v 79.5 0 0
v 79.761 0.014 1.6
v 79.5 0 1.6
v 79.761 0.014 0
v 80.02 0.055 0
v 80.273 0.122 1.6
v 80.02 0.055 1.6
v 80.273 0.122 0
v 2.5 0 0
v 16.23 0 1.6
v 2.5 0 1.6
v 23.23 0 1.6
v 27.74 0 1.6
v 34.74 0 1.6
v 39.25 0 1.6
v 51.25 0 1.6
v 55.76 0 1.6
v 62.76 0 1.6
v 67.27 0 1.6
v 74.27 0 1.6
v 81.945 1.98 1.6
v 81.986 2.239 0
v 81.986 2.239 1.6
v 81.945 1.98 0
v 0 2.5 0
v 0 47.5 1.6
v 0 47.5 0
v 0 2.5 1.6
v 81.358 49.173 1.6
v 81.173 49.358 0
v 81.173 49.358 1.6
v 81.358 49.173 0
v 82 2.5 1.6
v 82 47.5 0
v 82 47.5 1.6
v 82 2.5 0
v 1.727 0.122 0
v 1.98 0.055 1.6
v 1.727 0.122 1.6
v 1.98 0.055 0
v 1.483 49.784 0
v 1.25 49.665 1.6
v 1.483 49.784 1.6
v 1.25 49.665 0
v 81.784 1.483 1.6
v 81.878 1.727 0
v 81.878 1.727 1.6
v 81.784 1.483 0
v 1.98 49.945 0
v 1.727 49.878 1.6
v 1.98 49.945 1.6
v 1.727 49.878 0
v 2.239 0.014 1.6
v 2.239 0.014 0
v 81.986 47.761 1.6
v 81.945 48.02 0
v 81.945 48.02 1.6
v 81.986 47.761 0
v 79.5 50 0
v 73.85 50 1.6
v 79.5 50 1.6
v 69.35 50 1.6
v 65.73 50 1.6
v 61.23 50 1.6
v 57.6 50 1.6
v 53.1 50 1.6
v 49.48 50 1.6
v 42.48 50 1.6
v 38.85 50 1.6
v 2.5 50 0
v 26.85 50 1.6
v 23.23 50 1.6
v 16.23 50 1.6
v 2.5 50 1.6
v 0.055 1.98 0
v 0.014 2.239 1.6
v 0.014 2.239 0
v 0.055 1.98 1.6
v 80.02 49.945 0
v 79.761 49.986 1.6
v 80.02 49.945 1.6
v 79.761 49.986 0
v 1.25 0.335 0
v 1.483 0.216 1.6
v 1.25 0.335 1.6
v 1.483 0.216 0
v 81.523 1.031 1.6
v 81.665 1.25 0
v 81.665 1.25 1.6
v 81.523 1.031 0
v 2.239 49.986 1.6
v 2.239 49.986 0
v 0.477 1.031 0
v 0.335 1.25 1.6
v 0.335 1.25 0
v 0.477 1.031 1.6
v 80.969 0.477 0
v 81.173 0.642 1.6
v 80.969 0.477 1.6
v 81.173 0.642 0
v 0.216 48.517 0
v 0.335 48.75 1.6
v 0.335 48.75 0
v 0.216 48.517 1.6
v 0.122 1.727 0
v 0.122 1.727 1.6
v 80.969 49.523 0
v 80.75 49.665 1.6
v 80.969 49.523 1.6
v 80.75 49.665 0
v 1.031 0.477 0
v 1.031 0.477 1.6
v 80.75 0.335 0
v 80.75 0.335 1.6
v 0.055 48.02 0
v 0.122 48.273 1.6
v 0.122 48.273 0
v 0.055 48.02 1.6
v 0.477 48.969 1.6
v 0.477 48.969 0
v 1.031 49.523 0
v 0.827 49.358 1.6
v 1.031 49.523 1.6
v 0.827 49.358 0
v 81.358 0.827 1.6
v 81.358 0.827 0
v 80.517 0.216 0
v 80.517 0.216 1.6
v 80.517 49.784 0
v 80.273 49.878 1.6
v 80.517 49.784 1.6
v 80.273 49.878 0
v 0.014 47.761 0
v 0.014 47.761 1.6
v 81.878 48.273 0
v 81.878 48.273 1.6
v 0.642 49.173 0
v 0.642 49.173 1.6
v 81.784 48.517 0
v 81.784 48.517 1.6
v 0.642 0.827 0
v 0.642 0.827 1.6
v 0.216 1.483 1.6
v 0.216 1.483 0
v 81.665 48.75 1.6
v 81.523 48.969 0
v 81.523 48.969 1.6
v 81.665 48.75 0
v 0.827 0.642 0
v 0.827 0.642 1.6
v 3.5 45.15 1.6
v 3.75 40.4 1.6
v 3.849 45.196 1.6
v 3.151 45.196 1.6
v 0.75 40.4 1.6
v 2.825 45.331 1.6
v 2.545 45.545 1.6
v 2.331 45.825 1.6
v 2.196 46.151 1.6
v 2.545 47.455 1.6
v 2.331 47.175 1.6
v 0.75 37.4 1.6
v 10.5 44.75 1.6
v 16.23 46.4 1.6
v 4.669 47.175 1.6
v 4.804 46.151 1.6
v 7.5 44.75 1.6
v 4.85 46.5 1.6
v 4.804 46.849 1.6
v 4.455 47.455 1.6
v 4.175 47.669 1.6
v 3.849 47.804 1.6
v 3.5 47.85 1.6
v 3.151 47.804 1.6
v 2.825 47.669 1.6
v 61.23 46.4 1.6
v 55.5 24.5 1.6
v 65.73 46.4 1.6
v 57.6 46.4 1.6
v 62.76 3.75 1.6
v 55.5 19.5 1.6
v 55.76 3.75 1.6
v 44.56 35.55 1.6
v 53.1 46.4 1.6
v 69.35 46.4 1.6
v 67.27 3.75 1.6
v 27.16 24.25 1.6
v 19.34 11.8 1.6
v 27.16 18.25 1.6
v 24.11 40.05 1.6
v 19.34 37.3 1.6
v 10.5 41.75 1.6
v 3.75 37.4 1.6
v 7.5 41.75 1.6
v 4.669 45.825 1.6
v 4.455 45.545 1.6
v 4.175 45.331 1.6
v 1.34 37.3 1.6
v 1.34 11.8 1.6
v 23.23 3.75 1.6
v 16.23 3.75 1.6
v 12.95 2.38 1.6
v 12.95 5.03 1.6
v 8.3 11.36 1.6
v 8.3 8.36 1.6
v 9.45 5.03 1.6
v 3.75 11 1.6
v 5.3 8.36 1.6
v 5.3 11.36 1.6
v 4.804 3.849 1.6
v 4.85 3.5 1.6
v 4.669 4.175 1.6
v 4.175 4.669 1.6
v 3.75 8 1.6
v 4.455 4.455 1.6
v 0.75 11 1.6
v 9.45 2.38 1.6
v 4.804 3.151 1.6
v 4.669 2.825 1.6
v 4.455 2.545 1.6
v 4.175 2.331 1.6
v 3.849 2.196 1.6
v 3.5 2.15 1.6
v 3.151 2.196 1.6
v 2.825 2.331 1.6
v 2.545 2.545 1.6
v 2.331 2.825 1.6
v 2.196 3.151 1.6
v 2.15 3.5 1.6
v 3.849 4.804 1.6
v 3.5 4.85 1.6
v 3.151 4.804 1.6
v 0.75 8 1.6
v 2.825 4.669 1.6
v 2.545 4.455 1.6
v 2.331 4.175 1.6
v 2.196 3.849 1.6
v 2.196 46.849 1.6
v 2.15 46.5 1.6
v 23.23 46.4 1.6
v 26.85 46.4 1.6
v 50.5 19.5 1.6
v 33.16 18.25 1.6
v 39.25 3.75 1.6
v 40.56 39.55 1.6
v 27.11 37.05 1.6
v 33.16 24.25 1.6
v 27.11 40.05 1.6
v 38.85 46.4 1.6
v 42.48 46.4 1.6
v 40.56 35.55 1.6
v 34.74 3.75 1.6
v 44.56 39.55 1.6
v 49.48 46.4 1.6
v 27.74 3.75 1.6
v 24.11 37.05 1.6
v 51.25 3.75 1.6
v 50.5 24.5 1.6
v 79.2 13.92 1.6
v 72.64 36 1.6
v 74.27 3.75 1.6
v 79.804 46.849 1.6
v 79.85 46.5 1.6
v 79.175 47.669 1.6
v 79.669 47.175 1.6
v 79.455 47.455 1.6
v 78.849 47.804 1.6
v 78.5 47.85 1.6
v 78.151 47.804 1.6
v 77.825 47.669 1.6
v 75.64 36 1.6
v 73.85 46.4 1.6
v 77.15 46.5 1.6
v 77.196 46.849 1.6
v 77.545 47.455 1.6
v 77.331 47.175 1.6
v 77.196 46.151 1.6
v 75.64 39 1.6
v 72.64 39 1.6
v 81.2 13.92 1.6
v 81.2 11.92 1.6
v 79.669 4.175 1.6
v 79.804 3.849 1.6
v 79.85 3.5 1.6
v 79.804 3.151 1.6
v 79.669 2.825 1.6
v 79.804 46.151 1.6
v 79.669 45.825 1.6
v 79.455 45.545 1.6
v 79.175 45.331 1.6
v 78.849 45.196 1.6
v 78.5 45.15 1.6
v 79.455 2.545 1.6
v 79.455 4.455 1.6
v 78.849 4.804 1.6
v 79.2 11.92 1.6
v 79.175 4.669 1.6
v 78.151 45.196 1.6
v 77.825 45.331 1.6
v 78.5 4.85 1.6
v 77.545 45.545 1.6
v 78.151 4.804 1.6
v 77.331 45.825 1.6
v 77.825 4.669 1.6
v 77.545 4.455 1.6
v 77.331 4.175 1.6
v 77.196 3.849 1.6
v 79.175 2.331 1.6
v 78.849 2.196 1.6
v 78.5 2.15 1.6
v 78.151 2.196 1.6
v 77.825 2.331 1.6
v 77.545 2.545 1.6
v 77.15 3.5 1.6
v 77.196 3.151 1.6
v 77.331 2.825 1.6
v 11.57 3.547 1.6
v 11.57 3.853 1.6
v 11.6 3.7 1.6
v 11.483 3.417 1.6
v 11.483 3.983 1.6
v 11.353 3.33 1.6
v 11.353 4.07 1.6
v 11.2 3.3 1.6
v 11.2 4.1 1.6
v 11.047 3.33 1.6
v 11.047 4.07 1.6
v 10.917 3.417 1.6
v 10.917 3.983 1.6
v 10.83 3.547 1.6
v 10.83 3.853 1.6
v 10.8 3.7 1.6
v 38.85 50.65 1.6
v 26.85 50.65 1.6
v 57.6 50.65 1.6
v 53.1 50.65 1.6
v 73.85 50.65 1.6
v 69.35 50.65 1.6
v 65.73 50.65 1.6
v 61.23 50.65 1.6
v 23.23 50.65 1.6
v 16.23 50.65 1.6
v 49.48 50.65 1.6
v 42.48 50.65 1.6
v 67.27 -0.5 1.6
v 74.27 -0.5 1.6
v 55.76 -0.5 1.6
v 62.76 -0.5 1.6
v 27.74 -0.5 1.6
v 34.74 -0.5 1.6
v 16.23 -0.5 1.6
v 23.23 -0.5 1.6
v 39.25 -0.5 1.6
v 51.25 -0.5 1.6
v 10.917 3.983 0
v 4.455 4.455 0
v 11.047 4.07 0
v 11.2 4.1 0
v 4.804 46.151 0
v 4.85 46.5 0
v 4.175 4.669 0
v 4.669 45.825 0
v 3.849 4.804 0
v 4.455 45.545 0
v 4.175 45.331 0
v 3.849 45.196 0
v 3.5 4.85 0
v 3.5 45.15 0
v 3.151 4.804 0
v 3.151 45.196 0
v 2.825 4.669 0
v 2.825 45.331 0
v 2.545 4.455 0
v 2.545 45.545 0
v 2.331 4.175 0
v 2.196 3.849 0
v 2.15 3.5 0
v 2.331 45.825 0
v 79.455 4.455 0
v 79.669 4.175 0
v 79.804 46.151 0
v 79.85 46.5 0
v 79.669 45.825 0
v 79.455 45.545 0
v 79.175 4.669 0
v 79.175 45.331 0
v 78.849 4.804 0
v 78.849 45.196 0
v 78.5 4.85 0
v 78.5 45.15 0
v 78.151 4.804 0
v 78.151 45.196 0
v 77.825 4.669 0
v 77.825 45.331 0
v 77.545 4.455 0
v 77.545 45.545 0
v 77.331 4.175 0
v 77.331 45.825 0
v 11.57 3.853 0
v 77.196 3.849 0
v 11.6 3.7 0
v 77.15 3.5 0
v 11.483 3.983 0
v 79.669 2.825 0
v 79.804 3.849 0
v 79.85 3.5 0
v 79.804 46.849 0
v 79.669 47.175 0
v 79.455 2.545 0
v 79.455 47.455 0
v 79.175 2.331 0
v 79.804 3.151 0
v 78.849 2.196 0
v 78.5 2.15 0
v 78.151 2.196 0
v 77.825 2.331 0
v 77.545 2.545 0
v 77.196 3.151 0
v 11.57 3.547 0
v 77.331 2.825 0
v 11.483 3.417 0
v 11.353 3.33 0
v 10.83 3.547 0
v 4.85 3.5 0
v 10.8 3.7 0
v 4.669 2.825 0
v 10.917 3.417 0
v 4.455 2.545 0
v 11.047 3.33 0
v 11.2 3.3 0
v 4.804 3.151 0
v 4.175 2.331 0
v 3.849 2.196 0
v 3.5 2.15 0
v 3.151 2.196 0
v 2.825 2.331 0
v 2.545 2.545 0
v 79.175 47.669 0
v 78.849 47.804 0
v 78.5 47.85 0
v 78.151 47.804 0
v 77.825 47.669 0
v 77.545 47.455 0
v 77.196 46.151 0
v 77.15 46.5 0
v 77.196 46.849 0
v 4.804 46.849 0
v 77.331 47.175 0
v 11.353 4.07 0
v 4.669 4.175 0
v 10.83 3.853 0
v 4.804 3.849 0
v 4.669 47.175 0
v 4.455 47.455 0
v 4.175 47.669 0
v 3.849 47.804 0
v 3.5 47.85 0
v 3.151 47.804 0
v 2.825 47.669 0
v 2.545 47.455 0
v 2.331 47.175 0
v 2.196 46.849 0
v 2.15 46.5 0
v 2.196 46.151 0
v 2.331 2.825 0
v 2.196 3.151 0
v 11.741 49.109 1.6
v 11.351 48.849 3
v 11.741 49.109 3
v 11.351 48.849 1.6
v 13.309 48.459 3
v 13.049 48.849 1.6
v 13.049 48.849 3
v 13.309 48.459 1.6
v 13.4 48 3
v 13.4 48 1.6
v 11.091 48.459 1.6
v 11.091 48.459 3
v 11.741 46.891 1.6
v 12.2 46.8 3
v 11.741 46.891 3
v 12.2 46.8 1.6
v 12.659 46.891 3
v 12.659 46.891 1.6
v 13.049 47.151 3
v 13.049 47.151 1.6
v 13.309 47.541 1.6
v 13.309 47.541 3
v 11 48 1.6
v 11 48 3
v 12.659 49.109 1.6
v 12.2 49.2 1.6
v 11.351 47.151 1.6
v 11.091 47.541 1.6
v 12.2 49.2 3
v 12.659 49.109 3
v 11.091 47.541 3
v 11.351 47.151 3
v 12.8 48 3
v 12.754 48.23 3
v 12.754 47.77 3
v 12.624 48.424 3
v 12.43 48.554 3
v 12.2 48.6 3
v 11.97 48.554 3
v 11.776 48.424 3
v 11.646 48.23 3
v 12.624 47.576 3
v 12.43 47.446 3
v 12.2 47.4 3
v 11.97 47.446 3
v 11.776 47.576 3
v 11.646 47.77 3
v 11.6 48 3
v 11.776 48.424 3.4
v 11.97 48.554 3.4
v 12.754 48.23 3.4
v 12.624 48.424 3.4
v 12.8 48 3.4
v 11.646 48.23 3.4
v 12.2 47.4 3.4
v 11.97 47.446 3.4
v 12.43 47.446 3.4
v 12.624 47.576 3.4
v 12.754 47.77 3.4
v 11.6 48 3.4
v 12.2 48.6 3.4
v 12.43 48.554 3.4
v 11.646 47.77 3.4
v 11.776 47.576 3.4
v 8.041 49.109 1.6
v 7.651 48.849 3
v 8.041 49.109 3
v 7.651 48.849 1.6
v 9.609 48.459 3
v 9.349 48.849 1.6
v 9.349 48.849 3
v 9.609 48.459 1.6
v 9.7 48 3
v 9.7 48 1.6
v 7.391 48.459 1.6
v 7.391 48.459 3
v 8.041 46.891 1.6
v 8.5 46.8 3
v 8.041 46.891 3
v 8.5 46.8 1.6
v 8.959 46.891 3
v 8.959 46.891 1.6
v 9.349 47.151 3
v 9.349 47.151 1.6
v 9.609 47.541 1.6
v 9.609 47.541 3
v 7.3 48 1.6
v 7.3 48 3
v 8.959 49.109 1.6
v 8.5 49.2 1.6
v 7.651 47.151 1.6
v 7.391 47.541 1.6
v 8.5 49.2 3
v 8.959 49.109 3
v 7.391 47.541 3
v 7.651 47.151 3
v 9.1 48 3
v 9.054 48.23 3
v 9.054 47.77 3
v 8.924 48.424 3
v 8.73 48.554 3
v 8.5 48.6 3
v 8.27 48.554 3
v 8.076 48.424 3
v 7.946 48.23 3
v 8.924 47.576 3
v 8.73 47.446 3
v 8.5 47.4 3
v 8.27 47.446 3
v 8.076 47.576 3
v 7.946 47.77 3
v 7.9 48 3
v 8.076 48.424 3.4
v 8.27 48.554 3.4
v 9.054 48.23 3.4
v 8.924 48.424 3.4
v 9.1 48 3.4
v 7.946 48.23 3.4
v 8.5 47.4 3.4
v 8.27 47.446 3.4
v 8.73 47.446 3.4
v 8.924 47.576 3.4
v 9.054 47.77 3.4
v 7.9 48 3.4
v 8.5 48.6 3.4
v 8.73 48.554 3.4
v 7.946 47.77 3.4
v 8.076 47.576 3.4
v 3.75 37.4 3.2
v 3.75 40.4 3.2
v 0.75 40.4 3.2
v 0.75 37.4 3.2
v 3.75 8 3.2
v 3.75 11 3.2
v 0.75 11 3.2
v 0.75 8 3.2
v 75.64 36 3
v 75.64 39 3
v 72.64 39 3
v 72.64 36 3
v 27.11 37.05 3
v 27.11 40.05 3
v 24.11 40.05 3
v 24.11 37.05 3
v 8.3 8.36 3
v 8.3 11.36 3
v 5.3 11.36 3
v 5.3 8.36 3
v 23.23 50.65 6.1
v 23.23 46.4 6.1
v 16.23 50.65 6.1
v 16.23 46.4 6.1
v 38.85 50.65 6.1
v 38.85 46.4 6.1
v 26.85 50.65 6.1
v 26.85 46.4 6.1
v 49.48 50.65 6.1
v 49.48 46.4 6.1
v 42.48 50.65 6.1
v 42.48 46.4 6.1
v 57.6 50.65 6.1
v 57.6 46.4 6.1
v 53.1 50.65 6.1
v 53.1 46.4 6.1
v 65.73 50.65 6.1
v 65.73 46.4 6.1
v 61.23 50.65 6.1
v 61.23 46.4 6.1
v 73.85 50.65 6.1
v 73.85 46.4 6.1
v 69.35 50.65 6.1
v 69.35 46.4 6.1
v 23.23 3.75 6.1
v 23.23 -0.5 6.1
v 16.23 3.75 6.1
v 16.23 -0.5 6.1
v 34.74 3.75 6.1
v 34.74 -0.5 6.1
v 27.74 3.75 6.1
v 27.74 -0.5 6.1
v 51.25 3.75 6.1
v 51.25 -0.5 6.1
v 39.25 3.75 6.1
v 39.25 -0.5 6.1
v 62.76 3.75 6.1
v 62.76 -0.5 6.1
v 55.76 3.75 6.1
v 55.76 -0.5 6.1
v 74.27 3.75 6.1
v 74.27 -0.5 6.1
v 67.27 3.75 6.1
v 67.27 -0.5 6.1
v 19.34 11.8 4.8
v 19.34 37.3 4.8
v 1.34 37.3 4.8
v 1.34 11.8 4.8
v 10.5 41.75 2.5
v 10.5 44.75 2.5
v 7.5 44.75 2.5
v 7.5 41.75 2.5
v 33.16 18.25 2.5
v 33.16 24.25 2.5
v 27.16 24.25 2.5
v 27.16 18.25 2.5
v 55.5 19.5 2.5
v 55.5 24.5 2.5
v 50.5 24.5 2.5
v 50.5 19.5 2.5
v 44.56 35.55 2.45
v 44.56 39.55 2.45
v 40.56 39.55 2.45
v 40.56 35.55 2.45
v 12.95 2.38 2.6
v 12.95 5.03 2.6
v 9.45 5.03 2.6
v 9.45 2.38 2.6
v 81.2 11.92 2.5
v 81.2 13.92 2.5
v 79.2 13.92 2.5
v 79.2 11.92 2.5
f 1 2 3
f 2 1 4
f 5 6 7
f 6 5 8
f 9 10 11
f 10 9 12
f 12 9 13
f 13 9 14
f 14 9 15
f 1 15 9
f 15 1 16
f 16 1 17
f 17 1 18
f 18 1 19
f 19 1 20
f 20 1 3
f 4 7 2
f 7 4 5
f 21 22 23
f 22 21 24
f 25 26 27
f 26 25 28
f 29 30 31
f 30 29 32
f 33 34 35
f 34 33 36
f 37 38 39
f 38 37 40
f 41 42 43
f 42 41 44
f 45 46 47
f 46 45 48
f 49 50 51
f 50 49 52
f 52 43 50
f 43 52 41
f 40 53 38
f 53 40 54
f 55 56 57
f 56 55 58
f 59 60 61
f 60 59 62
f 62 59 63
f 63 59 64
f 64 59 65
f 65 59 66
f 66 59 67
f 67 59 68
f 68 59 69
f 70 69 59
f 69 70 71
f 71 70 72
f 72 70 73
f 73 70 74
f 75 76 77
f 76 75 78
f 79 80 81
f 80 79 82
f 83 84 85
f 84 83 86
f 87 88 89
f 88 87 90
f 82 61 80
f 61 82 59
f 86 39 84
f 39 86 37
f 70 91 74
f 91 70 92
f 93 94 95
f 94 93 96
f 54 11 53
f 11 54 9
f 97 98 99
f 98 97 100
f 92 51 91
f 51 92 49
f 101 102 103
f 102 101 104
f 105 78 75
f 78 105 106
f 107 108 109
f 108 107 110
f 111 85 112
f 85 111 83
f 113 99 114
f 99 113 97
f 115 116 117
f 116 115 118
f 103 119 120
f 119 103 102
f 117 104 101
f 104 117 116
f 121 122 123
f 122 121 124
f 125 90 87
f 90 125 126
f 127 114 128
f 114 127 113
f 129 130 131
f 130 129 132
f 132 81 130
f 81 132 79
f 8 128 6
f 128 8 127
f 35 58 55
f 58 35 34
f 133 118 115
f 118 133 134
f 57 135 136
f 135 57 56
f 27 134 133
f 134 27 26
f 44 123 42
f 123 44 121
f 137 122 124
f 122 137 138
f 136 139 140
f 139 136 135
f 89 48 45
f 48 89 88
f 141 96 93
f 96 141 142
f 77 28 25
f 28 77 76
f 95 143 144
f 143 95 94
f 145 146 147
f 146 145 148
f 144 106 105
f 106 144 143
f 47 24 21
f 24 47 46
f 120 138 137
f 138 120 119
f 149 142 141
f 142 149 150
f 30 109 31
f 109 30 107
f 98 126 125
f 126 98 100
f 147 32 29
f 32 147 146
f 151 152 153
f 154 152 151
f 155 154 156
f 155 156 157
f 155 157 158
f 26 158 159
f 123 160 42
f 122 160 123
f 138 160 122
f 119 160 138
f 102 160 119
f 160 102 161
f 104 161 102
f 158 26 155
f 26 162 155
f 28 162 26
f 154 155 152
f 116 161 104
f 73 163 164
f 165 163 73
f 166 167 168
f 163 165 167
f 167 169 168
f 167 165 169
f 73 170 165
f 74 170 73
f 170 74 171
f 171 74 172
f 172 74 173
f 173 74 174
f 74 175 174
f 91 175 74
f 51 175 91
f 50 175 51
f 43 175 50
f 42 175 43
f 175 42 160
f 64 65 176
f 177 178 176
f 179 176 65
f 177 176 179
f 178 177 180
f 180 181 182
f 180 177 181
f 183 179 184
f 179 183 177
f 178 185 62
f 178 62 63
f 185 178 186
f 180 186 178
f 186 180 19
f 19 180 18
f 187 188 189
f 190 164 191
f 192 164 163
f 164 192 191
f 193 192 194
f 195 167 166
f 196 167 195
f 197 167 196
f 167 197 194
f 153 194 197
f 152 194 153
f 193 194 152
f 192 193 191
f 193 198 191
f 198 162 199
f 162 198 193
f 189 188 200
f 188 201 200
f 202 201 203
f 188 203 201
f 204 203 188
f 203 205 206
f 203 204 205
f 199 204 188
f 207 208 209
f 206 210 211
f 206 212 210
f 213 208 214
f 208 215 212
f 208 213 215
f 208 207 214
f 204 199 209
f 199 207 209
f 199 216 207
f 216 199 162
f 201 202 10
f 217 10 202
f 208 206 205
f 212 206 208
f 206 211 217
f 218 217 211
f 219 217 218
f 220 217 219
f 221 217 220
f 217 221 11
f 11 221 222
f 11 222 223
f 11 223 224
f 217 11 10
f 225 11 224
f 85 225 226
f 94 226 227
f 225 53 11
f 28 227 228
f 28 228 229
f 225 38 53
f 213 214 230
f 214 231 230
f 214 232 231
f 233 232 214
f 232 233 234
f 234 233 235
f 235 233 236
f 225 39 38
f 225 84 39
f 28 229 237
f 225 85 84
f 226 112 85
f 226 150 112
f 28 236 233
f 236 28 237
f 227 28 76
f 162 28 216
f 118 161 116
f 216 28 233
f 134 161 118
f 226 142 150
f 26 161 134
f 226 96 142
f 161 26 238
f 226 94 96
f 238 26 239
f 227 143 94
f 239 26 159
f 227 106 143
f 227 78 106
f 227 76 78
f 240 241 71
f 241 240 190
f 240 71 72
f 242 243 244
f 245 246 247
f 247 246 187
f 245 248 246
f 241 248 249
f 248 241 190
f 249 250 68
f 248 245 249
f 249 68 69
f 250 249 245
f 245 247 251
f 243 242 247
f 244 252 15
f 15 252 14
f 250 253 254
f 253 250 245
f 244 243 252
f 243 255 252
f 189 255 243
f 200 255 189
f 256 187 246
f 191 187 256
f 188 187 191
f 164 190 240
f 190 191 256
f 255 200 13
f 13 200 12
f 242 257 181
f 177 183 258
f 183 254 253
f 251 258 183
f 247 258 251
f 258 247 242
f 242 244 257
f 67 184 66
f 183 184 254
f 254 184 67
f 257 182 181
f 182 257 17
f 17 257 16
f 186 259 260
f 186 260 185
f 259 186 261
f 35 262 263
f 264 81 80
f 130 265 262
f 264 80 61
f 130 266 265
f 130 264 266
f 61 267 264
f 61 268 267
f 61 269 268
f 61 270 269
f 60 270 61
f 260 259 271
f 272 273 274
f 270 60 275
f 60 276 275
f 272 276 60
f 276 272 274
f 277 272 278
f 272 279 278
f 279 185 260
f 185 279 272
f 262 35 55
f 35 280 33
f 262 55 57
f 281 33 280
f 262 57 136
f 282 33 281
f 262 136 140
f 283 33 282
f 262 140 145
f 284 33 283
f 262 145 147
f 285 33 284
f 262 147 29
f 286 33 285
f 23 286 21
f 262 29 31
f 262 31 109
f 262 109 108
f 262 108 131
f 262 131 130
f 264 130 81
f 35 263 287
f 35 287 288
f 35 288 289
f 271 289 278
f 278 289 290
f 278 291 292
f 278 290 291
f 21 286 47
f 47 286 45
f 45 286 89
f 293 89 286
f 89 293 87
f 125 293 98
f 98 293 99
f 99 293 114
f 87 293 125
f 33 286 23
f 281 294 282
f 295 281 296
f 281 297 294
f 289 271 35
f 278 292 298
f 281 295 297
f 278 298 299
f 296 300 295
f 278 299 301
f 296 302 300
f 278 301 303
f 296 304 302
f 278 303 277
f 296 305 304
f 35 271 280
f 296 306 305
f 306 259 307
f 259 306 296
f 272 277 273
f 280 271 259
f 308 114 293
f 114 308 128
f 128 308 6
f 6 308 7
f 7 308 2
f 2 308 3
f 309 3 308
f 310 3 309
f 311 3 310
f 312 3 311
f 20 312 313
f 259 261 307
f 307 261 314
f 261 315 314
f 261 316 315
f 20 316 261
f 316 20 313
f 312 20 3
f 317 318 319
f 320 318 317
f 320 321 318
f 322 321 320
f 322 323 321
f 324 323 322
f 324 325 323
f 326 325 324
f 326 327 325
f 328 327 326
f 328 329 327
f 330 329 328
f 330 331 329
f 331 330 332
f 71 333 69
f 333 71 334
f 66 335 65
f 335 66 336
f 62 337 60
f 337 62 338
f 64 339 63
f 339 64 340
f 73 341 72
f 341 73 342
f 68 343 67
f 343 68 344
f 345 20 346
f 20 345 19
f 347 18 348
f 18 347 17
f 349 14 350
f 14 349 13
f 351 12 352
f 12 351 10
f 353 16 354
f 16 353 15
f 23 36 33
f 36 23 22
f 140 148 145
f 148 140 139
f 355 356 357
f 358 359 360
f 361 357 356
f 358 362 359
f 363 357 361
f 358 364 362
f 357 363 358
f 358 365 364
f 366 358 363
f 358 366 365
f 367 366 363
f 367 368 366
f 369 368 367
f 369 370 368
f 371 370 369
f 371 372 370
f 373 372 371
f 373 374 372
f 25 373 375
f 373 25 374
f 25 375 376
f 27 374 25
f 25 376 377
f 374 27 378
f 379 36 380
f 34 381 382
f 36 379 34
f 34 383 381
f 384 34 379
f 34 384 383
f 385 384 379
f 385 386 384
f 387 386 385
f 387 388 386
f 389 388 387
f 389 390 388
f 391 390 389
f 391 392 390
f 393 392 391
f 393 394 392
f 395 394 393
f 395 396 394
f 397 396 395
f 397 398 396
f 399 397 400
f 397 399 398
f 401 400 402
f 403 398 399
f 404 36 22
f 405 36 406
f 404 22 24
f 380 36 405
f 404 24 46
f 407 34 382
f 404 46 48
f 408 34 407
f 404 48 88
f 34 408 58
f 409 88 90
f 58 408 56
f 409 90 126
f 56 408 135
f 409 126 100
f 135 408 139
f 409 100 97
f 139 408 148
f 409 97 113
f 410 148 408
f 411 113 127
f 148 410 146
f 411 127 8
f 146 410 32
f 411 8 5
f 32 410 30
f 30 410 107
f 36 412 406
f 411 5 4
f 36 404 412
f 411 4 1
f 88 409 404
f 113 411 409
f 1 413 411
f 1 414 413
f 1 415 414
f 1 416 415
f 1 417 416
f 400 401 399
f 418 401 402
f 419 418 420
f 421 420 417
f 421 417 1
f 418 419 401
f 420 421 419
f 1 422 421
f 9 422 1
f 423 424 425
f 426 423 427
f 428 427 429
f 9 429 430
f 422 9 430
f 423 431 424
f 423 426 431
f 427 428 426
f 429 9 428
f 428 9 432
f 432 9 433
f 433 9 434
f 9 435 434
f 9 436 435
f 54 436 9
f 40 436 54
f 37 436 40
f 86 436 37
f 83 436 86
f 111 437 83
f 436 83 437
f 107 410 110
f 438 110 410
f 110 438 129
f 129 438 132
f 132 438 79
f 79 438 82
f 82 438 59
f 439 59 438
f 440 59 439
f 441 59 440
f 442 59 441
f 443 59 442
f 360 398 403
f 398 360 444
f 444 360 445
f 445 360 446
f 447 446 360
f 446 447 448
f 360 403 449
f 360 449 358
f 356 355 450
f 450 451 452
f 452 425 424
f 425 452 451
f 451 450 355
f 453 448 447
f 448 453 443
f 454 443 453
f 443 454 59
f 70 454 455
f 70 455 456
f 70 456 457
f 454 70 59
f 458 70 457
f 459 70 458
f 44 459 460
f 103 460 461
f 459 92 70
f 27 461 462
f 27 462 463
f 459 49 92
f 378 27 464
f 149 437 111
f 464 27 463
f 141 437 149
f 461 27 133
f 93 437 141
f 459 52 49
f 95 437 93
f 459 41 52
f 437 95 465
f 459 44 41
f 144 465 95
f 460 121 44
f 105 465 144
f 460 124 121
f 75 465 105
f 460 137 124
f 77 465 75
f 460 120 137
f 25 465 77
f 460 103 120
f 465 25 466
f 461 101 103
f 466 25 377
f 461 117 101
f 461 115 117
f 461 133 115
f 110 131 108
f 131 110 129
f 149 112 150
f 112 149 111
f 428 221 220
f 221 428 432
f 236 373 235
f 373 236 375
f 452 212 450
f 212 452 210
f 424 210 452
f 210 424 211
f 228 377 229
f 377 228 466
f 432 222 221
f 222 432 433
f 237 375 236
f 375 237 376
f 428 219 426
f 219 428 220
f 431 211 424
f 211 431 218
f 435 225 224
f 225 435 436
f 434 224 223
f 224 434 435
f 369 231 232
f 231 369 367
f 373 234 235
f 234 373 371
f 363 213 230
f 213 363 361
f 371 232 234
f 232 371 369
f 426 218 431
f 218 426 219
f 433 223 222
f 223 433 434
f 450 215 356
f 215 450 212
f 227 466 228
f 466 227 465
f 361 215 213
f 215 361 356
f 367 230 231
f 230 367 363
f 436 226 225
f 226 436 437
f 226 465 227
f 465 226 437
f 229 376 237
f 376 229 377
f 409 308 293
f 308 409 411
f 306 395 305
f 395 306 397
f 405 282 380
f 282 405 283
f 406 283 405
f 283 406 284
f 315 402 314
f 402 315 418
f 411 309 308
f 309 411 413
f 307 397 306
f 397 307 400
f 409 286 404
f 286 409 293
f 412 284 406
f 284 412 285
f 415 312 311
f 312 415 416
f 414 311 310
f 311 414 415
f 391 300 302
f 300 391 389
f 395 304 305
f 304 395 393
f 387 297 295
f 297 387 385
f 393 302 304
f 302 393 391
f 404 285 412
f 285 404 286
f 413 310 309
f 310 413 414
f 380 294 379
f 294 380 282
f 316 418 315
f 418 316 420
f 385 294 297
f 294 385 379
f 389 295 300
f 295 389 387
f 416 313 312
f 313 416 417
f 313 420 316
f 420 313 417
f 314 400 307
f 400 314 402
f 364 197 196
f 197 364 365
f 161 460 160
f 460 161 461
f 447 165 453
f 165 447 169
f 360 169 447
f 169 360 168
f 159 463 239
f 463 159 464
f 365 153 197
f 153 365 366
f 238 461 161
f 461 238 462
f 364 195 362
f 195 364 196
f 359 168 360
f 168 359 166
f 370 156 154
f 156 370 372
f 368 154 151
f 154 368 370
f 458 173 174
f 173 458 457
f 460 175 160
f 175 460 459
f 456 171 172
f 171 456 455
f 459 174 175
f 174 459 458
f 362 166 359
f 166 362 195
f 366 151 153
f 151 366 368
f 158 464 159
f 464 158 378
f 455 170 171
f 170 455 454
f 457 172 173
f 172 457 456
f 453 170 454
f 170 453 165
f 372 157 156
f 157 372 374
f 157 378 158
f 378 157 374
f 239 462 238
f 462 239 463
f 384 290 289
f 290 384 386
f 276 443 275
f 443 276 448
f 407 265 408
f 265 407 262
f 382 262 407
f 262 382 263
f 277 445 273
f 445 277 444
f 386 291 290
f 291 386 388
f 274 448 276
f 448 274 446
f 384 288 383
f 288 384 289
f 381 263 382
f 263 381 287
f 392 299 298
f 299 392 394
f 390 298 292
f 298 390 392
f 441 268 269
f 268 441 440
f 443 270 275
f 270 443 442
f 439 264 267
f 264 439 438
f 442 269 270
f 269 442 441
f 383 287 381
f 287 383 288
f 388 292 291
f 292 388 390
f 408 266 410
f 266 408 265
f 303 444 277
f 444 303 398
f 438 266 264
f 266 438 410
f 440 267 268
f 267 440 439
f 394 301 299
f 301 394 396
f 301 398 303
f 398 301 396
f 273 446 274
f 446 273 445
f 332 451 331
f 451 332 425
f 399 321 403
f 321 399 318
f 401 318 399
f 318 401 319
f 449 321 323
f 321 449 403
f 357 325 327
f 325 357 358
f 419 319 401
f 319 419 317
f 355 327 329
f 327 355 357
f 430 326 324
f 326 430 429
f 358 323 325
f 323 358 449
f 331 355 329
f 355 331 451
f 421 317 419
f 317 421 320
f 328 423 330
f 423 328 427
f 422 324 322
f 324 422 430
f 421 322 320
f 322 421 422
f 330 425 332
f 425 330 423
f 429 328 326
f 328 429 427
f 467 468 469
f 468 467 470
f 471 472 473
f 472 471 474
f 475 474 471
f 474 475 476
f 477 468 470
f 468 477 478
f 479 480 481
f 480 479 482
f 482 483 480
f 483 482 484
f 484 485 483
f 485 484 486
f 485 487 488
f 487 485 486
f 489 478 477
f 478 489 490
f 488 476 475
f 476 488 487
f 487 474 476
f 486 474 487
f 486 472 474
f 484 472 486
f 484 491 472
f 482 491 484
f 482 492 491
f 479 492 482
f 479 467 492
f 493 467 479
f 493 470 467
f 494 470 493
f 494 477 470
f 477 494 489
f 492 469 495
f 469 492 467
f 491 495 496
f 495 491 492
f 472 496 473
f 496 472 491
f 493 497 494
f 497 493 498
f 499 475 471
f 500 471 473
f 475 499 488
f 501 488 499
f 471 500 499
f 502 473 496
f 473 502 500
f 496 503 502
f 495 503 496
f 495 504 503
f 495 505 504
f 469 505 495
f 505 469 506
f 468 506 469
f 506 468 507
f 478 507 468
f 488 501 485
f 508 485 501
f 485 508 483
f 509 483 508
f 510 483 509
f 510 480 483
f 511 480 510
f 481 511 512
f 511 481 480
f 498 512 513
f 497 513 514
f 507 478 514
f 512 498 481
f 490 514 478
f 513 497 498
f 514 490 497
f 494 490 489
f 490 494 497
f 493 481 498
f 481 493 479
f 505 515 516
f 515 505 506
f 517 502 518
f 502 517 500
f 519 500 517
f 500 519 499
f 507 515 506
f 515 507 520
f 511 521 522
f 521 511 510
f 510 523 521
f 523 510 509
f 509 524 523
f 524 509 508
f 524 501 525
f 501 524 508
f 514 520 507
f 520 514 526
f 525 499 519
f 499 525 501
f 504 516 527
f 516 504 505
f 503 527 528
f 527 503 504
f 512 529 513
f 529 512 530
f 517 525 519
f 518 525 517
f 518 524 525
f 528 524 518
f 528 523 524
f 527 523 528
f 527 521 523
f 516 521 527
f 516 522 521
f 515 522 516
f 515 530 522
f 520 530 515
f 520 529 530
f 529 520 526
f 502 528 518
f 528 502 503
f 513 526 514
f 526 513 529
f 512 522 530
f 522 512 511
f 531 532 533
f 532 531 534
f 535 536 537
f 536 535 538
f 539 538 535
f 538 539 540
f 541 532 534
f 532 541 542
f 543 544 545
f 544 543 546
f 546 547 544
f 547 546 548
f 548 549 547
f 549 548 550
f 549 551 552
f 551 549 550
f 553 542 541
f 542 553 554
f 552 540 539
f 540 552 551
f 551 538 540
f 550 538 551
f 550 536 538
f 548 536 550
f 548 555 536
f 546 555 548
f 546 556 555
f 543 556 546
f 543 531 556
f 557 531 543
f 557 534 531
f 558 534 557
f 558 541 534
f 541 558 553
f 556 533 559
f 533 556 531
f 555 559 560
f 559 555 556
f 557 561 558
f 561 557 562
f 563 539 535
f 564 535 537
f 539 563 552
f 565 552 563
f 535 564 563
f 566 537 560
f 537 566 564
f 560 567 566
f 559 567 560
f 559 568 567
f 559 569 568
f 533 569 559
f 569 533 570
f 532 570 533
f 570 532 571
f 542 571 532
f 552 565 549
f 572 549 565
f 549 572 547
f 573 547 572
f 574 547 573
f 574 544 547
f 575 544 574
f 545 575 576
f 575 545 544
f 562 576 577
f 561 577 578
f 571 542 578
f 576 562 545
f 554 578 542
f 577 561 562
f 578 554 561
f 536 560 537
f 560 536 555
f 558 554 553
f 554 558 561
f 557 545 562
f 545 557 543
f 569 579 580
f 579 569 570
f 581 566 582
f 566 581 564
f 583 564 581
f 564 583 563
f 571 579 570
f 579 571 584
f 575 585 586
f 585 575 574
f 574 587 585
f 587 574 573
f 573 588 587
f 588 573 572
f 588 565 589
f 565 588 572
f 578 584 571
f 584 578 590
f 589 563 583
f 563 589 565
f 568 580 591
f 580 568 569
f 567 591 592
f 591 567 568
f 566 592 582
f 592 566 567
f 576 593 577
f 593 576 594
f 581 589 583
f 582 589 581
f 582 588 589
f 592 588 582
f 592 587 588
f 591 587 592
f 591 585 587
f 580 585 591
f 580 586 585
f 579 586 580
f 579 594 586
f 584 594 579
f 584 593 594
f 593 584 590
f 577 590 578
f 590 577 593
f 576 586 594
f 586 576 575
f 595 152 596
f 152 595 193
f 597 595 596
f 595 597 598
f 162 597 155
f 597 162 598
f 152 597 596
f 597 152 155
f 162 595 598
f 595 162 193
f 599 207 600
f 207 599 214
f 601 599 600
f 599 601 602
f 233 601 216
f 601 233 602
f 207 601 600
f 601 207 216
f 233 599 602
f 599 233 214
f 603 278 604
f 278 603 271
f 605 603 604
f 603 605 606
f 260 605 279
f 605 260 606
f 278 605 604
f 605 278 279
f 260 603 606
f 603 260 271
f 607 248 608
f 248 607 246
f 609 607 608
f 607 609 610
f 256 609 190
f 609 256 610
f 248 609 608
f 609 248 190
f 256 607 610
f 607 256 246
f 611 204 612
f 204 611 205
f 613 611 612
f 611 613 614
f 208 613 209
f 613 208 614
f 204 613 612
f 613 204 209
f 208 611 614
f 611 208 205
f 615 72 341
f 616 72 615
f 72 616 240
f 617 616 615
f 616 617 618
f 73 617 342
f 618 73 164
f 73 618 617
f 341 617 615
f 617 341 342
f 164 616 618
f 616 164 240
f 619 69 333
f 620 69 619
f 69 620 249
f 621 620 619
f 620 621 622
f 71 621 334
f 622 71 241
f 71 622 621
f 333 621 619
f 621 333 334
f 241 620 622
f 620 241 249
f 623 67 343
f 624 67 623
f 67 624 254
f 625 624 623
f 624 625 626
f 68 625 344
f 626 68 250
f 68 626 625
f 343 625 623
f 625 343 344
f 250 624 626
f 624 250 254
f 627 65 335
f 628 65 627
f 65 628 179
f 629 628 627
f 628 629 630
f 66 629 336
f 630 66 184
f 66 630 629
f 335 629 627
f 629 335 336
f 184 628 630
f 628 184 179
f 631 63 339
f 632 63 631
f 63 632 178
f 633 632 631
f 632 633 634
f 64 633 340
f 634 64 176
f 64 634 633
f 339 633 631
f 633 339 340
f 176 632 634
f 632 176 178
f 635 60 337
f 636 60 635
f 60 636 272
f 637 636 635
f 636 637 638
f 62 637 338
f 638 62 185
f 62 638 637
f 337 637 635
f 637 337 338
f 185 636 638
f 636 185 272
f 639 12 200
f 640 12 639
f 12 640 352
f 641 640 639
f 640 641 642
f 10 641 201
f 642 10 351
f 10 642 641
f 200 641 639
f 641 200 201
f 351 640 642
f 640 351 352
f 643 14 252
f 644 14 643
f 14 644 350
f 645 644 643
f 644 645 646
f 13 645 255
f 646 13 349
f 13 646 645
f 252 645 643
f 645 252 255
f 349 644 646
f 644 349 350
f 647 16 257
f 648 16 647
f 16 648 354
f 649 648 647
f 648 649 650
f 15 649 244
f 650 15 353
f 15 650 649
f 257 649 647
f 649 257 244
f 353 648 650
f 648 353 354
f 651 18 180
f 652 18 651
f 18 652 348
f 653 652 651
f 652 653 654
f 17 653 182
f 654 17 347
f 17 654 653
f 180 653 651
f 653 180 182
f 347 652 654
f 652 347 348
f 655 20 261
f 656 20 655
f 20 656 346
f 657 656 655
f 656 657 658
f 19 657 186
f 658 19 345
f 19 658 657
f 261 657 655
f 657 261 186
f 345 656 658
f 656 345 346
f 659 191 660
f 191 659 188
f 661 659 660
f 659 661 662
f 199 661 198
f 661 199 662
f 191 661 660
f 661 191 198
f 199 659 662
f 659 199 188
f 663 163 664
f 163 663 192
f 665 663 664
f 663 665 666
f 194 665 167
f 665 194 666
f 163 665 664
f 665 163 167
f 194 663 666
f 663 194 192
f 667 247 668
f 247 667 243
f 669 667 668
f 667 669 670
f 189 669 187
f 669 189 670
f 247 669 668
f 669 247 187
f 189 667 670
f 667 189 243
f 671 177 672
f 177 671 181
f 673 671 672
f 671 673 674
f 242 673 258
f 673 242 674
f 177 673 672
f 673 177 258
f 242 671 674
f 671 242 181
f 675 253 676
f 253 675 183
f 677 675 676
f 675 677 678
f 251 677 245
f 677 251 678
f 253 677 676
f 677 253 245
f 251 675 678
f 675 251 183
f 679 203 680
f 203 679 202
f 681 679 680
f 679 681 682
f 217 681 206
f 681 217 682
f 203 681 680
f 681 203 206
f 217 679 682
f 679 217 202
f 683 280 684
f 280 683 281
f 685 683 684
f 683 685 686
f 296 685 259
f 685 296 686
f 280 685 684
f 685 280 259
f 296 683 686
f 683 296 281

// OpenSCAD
// =============================================================================
// OpenMotorBridge - Dummy 3D Model: Universal Front Node PCB (PCBA 05 v10.0)
// =============================================================================
// File: hardware/cad/scad/04_front_node/parts/006_dummy_front_node_pcb.scad
// Description: Exact 1:1 3D dummy of openmotorbridge_front_node.kicad_pcb
//              (82.0 x 50.0 x 1.6 mm, 4-Layer FR4) reflecting the v10.0 routed
//              board with ESP32-S31 + ESP32-C3, Dual Wi-Fi (ANT1 & ANT2 U.FL),
//              Dual USB2514B Hubs (U2 & U10), SW3526 20W PD, Knowles MEMS,
//              and all 11 horizontal JST GH connectors.
//
// Axis convention:
//   X: West (0 mm) -> East (82 mm)
//   Y: South (0 mm, Cockpit) -> North (50 mm, Vehicle / Front)
//   Z: Bottom (0 mm) -> Top (1.6 mm substrate + components)
// =============================================================================

include <../../00_common/parameters.scad>;

module dummy_front_node_pcb() {
    // 1. PCB Substrate (FR4 4-Layer Dark Blue/Green, 82.0 x 50.0 x 1.6 mm)
    color([0.10, 0.25, 0.20]) {
        difference() {
            // Rounded rectangle substrate matching KiCad Edge.Cuts
            linear_extrude(height = FRONT_NODE_PCB_H) {
                offset(r = FRONT_NODE_PCB_R) {
                    offset(delta = -FRONT_NODE_PCB_R) {
                        square([FRONT_NODE_PCB_L, FRONT_NODE_PCB_W], center=false);
                    }
                }
            }
            
            // 4x M2.5 Mounting Holes (KiCad H1-H4 at 75.0 x 43.0 mm pitch)
            translate([3.50, 3.50, -0.1]) cylinder(r=1.35, h=FRONT_NODE_PCB_H + 0.2, $fn=24);
            translate([FRONT_NODE_PCB_L - 3.50, 3.50, -0.1]) cylinder(r=1.35, h=FRONT_NODE_PCB_H + 0.2, $fn=24);
            translate([3.50, FRONT_NODE_PCB_W - 3.50, -0.1]) cylinder(r=1.35, h=FRONT_NODE_PCB_H + 0.2, $fn=24);
            translate([FRONT_NODE_PCB_L - 3.50, FRONT_NODE_PCB_W - 3.50, -0.1]) cylinder(r=1.35, h=FRONT_NODE_PCB_H + 0.2, $fn=24);
            
            // Knowles MEMS Acoustic sound port hole (Ø 0.8 mm) at (11.20, 3.70)
            translate([11.20, 3.70, -0.1]) cylinder(r=0.4, h=FRONT_NODE_PCB_H + 0.2, $fn=16);
        }
    }

    // 2. Dual U.FL Antenna Ports for Wi-Fi (ANT1 at 12.20, 48.00 and ANT2 at 8.50, 48.00)
    color("gold") {
        translate([12.20, 48.00, FRONT_NODE_PCB_H]) {
            cylinder(r=1.2, h=1.4, $fn=16);
            translate([0, 0, 1.4]) cylinder(r=0.6, h=0.4, $fn=16);
        }
        translate([8.50, 48.00, FRONT_NODE_PCB_H]) {
            cylinder(r=1.2, h=1.4, $fn=16);
            translate([0, 0, 1.4]) cylinder(r=0.6, h=0.4, $fn=16);
        }
    }

    // 3. ESP32-S31-WROOM-1U Core Controller Module (U1 at 10.34, 24.55)
    color("silver") {
        translate([10.34 - 9.0, 24.55 - 12.75, FRONT_NODE_PCB_H])
            cube(size=[18.0, 25.5, 3.2], center=false); // Shield can
    }

    // 4. ESP32-C3-FN4 Sub-Controller (U9 at 9.00, 43.25)
    color("darkslategray") {
        translate([9.00 - 1.5, 43.25 - 1.5, FRONT_NODE_PCB_H])
            cube(size=[3.0, 3.0, 0.9], center=false); // QFN-16
    }

    // 5. Microchip USB2514B Automotive 4-Port USB Hub #1 (U2 at 30.16, 21.25)
    color("darkslategray") {
        translate([30.16 - 3.0, 21.25 - 3.0, FRONT_NODE_PCB_H])
            cube(size=[6.0, 6.0, 0.9], center=false); // QFN-36
    }

    // 6. Microchip USB2514B Automotive 4-Port USB Hub #2 (U10 at 53.00, 22.00)
    color("darkslategray") {
        translate([53.00 - 2.5, 22.00 - 2.5, FRONT_NODE_PCB_H])
            cube(size=[5.0, 5.0, 0.9], center=false); // QFN-32
    }

    // 7. SW3526 Synchronous Step-Down USB-PD Controller (U5 at 42.56, 37.55)
    color("darkslategray") {
        translate([42.56 - 2.0, 37.55 - 2.0, FRONT_NODE_PCB_H])
            cube(size=[4.0, 4.0, 0.85], center=false); // QFN-28
    }

    // 8. Knowles SPH0645 Digital I2S MEMS Microphone (MK1 at 11.20, 3.70)
    color("goldenrod") {
        translate([11.20 - 1.75, 3.70 - 1.32, FRONT_NODE_PCB_H])
            cube(size=[3.5, 2.65, 1.0], center=false);
    }

    // 9. Tactical Switches: SW1 (Boot at 2.25, 38.90) & SW2 (Reset at 2.25, 9.50)
    color("dimgray") {
        translate([2.25 - 1.5, 38.90 - 1.5, FRONT_NODE_PCB_H])
            cube(size=[3.0, 3.0, 1.6], center=false);
        translate([2.25 - 1.5, 9.50 - 1.5, FRONT_NODE_PCB_H])
            cube(size=[3.0, 3.0, 1.6], center=false);
    }

    // 10. Status RGB LED (LED1 WS2812B-2020 at 80.20, 12.92)
    color("white") {
        translate([80.20 - 1.0, 12.92 - 1.0, FRONT_NODE_PCB_H])
            cube(size=[2.0, 2.0, 0.9], center=false);
    }

    // 11. Power Regulators: U3 (TPS54302 at 74.14, 37.50), U4 (TPS2051B at 25.61, 38.55), U7 (TLV75533 at 6.80, 9.86)
    color("darkslategray") {
        translate([74.14 - 1.5, 37.50 - 1.5, FRONT_NODE_PCB_H]) cube([3.0, 3.0, 1.4], center=false);
        translate([25.61 - 1.5, 38.55 - 1.5, FRONT_NODE_PCB_H]) cube([3.0, 3.0, 1.4], center=false);
        translate([6.80 - 1.5, 9.86 - 1.5, FRONT_NODE_PCB_H]) cube([3.0, 3.0, 1.4], center=false);
    }

    // 12. NORTH EDGE CONNECTORS (Vehicle & Accessories: J1, J4, J5, J7, J10, J8 at Y = 46.65 mm, facing +Y)
    color("ghostwhite") {
        // J1: Backbone 4P JST GH (19.73, 46.65)
        translate([19.73 - 3.5, 46.65 - 0.25, FRONT_NODE_PCB_H]) cube([7.0, 4.25, 4.5], center=false);
        // J4: Ext Hub 8P JST GH (32.85, 46.65)
        translate([32.85 - 6.0, 46.65 - 0.25, FRONT_NODE_PCB_H]) cube([12.0, 4.25, 4.5], center=false);
        // J5: Dongle 4P JST GH (45.98, 46.65)
        translate([45.98 - 3.5, 46.65 - 0.25, FRONT_NODE_PCB_H]) cube([7.0, 4.25, 4.5], center=false);
        // J7: Aux Light 2P JST GH (55.35, 46.65)
        translate([55.35 - 2.25, 46.65 - 0.25, FRONT_NODE_PCB_H]) cube([4.5, 4.25, 4.5], center=false);
        // J10: Navi Power 2P JST GH (63.48, 46.65)
        translate([63.48 - 2.25, 46.65 - 0.25, FRONT_NODE_PCB_H]) cube([4.5, 4.25, 4.5], center=false);
        // J8: Cam Power 2P JST GH (71.60, 46.65)
        translate([71.60 - 2.25, 46.65 - 0.25, FRONT_NODE_PCB_H]) cube([4.5, 4.25, 4.5], center=false);
    }

    // 13. SOUTH EDGE CONNECTORS (Cockpit: J3, J11, J6, J9, J2 at Y = 3.50 mm, facing -Y)
    color("ghostwhite") {
        // J3: Pod R 4P JST GH (19.73, 3.50)
        translate([19.73 - 3.5, 3.50 - 4.0, FRONT_NODE_PCB_H]) cube([7.0, 4.25, 4.5], center=false);
        // J11: Disp R 4P JST GH (31.24, 3.50)
        translate([31.24 - 3.5, 3.50 - 4.0, FRONT_NODE_PCB_H]) cube([7.0, 4.25, 4.5], center=false);
        // J6: Sensor Puck 8P JST GH (45.25, 3.50)
        translate([45.25 - 6.0, 3.50 - 4.0, FRONT_NODE_PCB_H]) cube([12.0, 4.25, 4.5], center=false);
        // J9: Disp L 4P JST GH (59.26, 3.50)
        translate([59.26 - 3.5, 3.50 - 4.0, FRONT_NODE_PCB_H]) cube([7.0, 4.25, 4.5], center=false);
        // J2: Pod L 4P JST GH (70.77, 3.50)
        translate([70.77 - 3.5, 3.50 - 4.0, FRONT_NODE_PCB_H]) cube([7.0, 4.25, 4.5], center=false);
    }
}

// Standalone compilation
dummy_front_node_pcb();
